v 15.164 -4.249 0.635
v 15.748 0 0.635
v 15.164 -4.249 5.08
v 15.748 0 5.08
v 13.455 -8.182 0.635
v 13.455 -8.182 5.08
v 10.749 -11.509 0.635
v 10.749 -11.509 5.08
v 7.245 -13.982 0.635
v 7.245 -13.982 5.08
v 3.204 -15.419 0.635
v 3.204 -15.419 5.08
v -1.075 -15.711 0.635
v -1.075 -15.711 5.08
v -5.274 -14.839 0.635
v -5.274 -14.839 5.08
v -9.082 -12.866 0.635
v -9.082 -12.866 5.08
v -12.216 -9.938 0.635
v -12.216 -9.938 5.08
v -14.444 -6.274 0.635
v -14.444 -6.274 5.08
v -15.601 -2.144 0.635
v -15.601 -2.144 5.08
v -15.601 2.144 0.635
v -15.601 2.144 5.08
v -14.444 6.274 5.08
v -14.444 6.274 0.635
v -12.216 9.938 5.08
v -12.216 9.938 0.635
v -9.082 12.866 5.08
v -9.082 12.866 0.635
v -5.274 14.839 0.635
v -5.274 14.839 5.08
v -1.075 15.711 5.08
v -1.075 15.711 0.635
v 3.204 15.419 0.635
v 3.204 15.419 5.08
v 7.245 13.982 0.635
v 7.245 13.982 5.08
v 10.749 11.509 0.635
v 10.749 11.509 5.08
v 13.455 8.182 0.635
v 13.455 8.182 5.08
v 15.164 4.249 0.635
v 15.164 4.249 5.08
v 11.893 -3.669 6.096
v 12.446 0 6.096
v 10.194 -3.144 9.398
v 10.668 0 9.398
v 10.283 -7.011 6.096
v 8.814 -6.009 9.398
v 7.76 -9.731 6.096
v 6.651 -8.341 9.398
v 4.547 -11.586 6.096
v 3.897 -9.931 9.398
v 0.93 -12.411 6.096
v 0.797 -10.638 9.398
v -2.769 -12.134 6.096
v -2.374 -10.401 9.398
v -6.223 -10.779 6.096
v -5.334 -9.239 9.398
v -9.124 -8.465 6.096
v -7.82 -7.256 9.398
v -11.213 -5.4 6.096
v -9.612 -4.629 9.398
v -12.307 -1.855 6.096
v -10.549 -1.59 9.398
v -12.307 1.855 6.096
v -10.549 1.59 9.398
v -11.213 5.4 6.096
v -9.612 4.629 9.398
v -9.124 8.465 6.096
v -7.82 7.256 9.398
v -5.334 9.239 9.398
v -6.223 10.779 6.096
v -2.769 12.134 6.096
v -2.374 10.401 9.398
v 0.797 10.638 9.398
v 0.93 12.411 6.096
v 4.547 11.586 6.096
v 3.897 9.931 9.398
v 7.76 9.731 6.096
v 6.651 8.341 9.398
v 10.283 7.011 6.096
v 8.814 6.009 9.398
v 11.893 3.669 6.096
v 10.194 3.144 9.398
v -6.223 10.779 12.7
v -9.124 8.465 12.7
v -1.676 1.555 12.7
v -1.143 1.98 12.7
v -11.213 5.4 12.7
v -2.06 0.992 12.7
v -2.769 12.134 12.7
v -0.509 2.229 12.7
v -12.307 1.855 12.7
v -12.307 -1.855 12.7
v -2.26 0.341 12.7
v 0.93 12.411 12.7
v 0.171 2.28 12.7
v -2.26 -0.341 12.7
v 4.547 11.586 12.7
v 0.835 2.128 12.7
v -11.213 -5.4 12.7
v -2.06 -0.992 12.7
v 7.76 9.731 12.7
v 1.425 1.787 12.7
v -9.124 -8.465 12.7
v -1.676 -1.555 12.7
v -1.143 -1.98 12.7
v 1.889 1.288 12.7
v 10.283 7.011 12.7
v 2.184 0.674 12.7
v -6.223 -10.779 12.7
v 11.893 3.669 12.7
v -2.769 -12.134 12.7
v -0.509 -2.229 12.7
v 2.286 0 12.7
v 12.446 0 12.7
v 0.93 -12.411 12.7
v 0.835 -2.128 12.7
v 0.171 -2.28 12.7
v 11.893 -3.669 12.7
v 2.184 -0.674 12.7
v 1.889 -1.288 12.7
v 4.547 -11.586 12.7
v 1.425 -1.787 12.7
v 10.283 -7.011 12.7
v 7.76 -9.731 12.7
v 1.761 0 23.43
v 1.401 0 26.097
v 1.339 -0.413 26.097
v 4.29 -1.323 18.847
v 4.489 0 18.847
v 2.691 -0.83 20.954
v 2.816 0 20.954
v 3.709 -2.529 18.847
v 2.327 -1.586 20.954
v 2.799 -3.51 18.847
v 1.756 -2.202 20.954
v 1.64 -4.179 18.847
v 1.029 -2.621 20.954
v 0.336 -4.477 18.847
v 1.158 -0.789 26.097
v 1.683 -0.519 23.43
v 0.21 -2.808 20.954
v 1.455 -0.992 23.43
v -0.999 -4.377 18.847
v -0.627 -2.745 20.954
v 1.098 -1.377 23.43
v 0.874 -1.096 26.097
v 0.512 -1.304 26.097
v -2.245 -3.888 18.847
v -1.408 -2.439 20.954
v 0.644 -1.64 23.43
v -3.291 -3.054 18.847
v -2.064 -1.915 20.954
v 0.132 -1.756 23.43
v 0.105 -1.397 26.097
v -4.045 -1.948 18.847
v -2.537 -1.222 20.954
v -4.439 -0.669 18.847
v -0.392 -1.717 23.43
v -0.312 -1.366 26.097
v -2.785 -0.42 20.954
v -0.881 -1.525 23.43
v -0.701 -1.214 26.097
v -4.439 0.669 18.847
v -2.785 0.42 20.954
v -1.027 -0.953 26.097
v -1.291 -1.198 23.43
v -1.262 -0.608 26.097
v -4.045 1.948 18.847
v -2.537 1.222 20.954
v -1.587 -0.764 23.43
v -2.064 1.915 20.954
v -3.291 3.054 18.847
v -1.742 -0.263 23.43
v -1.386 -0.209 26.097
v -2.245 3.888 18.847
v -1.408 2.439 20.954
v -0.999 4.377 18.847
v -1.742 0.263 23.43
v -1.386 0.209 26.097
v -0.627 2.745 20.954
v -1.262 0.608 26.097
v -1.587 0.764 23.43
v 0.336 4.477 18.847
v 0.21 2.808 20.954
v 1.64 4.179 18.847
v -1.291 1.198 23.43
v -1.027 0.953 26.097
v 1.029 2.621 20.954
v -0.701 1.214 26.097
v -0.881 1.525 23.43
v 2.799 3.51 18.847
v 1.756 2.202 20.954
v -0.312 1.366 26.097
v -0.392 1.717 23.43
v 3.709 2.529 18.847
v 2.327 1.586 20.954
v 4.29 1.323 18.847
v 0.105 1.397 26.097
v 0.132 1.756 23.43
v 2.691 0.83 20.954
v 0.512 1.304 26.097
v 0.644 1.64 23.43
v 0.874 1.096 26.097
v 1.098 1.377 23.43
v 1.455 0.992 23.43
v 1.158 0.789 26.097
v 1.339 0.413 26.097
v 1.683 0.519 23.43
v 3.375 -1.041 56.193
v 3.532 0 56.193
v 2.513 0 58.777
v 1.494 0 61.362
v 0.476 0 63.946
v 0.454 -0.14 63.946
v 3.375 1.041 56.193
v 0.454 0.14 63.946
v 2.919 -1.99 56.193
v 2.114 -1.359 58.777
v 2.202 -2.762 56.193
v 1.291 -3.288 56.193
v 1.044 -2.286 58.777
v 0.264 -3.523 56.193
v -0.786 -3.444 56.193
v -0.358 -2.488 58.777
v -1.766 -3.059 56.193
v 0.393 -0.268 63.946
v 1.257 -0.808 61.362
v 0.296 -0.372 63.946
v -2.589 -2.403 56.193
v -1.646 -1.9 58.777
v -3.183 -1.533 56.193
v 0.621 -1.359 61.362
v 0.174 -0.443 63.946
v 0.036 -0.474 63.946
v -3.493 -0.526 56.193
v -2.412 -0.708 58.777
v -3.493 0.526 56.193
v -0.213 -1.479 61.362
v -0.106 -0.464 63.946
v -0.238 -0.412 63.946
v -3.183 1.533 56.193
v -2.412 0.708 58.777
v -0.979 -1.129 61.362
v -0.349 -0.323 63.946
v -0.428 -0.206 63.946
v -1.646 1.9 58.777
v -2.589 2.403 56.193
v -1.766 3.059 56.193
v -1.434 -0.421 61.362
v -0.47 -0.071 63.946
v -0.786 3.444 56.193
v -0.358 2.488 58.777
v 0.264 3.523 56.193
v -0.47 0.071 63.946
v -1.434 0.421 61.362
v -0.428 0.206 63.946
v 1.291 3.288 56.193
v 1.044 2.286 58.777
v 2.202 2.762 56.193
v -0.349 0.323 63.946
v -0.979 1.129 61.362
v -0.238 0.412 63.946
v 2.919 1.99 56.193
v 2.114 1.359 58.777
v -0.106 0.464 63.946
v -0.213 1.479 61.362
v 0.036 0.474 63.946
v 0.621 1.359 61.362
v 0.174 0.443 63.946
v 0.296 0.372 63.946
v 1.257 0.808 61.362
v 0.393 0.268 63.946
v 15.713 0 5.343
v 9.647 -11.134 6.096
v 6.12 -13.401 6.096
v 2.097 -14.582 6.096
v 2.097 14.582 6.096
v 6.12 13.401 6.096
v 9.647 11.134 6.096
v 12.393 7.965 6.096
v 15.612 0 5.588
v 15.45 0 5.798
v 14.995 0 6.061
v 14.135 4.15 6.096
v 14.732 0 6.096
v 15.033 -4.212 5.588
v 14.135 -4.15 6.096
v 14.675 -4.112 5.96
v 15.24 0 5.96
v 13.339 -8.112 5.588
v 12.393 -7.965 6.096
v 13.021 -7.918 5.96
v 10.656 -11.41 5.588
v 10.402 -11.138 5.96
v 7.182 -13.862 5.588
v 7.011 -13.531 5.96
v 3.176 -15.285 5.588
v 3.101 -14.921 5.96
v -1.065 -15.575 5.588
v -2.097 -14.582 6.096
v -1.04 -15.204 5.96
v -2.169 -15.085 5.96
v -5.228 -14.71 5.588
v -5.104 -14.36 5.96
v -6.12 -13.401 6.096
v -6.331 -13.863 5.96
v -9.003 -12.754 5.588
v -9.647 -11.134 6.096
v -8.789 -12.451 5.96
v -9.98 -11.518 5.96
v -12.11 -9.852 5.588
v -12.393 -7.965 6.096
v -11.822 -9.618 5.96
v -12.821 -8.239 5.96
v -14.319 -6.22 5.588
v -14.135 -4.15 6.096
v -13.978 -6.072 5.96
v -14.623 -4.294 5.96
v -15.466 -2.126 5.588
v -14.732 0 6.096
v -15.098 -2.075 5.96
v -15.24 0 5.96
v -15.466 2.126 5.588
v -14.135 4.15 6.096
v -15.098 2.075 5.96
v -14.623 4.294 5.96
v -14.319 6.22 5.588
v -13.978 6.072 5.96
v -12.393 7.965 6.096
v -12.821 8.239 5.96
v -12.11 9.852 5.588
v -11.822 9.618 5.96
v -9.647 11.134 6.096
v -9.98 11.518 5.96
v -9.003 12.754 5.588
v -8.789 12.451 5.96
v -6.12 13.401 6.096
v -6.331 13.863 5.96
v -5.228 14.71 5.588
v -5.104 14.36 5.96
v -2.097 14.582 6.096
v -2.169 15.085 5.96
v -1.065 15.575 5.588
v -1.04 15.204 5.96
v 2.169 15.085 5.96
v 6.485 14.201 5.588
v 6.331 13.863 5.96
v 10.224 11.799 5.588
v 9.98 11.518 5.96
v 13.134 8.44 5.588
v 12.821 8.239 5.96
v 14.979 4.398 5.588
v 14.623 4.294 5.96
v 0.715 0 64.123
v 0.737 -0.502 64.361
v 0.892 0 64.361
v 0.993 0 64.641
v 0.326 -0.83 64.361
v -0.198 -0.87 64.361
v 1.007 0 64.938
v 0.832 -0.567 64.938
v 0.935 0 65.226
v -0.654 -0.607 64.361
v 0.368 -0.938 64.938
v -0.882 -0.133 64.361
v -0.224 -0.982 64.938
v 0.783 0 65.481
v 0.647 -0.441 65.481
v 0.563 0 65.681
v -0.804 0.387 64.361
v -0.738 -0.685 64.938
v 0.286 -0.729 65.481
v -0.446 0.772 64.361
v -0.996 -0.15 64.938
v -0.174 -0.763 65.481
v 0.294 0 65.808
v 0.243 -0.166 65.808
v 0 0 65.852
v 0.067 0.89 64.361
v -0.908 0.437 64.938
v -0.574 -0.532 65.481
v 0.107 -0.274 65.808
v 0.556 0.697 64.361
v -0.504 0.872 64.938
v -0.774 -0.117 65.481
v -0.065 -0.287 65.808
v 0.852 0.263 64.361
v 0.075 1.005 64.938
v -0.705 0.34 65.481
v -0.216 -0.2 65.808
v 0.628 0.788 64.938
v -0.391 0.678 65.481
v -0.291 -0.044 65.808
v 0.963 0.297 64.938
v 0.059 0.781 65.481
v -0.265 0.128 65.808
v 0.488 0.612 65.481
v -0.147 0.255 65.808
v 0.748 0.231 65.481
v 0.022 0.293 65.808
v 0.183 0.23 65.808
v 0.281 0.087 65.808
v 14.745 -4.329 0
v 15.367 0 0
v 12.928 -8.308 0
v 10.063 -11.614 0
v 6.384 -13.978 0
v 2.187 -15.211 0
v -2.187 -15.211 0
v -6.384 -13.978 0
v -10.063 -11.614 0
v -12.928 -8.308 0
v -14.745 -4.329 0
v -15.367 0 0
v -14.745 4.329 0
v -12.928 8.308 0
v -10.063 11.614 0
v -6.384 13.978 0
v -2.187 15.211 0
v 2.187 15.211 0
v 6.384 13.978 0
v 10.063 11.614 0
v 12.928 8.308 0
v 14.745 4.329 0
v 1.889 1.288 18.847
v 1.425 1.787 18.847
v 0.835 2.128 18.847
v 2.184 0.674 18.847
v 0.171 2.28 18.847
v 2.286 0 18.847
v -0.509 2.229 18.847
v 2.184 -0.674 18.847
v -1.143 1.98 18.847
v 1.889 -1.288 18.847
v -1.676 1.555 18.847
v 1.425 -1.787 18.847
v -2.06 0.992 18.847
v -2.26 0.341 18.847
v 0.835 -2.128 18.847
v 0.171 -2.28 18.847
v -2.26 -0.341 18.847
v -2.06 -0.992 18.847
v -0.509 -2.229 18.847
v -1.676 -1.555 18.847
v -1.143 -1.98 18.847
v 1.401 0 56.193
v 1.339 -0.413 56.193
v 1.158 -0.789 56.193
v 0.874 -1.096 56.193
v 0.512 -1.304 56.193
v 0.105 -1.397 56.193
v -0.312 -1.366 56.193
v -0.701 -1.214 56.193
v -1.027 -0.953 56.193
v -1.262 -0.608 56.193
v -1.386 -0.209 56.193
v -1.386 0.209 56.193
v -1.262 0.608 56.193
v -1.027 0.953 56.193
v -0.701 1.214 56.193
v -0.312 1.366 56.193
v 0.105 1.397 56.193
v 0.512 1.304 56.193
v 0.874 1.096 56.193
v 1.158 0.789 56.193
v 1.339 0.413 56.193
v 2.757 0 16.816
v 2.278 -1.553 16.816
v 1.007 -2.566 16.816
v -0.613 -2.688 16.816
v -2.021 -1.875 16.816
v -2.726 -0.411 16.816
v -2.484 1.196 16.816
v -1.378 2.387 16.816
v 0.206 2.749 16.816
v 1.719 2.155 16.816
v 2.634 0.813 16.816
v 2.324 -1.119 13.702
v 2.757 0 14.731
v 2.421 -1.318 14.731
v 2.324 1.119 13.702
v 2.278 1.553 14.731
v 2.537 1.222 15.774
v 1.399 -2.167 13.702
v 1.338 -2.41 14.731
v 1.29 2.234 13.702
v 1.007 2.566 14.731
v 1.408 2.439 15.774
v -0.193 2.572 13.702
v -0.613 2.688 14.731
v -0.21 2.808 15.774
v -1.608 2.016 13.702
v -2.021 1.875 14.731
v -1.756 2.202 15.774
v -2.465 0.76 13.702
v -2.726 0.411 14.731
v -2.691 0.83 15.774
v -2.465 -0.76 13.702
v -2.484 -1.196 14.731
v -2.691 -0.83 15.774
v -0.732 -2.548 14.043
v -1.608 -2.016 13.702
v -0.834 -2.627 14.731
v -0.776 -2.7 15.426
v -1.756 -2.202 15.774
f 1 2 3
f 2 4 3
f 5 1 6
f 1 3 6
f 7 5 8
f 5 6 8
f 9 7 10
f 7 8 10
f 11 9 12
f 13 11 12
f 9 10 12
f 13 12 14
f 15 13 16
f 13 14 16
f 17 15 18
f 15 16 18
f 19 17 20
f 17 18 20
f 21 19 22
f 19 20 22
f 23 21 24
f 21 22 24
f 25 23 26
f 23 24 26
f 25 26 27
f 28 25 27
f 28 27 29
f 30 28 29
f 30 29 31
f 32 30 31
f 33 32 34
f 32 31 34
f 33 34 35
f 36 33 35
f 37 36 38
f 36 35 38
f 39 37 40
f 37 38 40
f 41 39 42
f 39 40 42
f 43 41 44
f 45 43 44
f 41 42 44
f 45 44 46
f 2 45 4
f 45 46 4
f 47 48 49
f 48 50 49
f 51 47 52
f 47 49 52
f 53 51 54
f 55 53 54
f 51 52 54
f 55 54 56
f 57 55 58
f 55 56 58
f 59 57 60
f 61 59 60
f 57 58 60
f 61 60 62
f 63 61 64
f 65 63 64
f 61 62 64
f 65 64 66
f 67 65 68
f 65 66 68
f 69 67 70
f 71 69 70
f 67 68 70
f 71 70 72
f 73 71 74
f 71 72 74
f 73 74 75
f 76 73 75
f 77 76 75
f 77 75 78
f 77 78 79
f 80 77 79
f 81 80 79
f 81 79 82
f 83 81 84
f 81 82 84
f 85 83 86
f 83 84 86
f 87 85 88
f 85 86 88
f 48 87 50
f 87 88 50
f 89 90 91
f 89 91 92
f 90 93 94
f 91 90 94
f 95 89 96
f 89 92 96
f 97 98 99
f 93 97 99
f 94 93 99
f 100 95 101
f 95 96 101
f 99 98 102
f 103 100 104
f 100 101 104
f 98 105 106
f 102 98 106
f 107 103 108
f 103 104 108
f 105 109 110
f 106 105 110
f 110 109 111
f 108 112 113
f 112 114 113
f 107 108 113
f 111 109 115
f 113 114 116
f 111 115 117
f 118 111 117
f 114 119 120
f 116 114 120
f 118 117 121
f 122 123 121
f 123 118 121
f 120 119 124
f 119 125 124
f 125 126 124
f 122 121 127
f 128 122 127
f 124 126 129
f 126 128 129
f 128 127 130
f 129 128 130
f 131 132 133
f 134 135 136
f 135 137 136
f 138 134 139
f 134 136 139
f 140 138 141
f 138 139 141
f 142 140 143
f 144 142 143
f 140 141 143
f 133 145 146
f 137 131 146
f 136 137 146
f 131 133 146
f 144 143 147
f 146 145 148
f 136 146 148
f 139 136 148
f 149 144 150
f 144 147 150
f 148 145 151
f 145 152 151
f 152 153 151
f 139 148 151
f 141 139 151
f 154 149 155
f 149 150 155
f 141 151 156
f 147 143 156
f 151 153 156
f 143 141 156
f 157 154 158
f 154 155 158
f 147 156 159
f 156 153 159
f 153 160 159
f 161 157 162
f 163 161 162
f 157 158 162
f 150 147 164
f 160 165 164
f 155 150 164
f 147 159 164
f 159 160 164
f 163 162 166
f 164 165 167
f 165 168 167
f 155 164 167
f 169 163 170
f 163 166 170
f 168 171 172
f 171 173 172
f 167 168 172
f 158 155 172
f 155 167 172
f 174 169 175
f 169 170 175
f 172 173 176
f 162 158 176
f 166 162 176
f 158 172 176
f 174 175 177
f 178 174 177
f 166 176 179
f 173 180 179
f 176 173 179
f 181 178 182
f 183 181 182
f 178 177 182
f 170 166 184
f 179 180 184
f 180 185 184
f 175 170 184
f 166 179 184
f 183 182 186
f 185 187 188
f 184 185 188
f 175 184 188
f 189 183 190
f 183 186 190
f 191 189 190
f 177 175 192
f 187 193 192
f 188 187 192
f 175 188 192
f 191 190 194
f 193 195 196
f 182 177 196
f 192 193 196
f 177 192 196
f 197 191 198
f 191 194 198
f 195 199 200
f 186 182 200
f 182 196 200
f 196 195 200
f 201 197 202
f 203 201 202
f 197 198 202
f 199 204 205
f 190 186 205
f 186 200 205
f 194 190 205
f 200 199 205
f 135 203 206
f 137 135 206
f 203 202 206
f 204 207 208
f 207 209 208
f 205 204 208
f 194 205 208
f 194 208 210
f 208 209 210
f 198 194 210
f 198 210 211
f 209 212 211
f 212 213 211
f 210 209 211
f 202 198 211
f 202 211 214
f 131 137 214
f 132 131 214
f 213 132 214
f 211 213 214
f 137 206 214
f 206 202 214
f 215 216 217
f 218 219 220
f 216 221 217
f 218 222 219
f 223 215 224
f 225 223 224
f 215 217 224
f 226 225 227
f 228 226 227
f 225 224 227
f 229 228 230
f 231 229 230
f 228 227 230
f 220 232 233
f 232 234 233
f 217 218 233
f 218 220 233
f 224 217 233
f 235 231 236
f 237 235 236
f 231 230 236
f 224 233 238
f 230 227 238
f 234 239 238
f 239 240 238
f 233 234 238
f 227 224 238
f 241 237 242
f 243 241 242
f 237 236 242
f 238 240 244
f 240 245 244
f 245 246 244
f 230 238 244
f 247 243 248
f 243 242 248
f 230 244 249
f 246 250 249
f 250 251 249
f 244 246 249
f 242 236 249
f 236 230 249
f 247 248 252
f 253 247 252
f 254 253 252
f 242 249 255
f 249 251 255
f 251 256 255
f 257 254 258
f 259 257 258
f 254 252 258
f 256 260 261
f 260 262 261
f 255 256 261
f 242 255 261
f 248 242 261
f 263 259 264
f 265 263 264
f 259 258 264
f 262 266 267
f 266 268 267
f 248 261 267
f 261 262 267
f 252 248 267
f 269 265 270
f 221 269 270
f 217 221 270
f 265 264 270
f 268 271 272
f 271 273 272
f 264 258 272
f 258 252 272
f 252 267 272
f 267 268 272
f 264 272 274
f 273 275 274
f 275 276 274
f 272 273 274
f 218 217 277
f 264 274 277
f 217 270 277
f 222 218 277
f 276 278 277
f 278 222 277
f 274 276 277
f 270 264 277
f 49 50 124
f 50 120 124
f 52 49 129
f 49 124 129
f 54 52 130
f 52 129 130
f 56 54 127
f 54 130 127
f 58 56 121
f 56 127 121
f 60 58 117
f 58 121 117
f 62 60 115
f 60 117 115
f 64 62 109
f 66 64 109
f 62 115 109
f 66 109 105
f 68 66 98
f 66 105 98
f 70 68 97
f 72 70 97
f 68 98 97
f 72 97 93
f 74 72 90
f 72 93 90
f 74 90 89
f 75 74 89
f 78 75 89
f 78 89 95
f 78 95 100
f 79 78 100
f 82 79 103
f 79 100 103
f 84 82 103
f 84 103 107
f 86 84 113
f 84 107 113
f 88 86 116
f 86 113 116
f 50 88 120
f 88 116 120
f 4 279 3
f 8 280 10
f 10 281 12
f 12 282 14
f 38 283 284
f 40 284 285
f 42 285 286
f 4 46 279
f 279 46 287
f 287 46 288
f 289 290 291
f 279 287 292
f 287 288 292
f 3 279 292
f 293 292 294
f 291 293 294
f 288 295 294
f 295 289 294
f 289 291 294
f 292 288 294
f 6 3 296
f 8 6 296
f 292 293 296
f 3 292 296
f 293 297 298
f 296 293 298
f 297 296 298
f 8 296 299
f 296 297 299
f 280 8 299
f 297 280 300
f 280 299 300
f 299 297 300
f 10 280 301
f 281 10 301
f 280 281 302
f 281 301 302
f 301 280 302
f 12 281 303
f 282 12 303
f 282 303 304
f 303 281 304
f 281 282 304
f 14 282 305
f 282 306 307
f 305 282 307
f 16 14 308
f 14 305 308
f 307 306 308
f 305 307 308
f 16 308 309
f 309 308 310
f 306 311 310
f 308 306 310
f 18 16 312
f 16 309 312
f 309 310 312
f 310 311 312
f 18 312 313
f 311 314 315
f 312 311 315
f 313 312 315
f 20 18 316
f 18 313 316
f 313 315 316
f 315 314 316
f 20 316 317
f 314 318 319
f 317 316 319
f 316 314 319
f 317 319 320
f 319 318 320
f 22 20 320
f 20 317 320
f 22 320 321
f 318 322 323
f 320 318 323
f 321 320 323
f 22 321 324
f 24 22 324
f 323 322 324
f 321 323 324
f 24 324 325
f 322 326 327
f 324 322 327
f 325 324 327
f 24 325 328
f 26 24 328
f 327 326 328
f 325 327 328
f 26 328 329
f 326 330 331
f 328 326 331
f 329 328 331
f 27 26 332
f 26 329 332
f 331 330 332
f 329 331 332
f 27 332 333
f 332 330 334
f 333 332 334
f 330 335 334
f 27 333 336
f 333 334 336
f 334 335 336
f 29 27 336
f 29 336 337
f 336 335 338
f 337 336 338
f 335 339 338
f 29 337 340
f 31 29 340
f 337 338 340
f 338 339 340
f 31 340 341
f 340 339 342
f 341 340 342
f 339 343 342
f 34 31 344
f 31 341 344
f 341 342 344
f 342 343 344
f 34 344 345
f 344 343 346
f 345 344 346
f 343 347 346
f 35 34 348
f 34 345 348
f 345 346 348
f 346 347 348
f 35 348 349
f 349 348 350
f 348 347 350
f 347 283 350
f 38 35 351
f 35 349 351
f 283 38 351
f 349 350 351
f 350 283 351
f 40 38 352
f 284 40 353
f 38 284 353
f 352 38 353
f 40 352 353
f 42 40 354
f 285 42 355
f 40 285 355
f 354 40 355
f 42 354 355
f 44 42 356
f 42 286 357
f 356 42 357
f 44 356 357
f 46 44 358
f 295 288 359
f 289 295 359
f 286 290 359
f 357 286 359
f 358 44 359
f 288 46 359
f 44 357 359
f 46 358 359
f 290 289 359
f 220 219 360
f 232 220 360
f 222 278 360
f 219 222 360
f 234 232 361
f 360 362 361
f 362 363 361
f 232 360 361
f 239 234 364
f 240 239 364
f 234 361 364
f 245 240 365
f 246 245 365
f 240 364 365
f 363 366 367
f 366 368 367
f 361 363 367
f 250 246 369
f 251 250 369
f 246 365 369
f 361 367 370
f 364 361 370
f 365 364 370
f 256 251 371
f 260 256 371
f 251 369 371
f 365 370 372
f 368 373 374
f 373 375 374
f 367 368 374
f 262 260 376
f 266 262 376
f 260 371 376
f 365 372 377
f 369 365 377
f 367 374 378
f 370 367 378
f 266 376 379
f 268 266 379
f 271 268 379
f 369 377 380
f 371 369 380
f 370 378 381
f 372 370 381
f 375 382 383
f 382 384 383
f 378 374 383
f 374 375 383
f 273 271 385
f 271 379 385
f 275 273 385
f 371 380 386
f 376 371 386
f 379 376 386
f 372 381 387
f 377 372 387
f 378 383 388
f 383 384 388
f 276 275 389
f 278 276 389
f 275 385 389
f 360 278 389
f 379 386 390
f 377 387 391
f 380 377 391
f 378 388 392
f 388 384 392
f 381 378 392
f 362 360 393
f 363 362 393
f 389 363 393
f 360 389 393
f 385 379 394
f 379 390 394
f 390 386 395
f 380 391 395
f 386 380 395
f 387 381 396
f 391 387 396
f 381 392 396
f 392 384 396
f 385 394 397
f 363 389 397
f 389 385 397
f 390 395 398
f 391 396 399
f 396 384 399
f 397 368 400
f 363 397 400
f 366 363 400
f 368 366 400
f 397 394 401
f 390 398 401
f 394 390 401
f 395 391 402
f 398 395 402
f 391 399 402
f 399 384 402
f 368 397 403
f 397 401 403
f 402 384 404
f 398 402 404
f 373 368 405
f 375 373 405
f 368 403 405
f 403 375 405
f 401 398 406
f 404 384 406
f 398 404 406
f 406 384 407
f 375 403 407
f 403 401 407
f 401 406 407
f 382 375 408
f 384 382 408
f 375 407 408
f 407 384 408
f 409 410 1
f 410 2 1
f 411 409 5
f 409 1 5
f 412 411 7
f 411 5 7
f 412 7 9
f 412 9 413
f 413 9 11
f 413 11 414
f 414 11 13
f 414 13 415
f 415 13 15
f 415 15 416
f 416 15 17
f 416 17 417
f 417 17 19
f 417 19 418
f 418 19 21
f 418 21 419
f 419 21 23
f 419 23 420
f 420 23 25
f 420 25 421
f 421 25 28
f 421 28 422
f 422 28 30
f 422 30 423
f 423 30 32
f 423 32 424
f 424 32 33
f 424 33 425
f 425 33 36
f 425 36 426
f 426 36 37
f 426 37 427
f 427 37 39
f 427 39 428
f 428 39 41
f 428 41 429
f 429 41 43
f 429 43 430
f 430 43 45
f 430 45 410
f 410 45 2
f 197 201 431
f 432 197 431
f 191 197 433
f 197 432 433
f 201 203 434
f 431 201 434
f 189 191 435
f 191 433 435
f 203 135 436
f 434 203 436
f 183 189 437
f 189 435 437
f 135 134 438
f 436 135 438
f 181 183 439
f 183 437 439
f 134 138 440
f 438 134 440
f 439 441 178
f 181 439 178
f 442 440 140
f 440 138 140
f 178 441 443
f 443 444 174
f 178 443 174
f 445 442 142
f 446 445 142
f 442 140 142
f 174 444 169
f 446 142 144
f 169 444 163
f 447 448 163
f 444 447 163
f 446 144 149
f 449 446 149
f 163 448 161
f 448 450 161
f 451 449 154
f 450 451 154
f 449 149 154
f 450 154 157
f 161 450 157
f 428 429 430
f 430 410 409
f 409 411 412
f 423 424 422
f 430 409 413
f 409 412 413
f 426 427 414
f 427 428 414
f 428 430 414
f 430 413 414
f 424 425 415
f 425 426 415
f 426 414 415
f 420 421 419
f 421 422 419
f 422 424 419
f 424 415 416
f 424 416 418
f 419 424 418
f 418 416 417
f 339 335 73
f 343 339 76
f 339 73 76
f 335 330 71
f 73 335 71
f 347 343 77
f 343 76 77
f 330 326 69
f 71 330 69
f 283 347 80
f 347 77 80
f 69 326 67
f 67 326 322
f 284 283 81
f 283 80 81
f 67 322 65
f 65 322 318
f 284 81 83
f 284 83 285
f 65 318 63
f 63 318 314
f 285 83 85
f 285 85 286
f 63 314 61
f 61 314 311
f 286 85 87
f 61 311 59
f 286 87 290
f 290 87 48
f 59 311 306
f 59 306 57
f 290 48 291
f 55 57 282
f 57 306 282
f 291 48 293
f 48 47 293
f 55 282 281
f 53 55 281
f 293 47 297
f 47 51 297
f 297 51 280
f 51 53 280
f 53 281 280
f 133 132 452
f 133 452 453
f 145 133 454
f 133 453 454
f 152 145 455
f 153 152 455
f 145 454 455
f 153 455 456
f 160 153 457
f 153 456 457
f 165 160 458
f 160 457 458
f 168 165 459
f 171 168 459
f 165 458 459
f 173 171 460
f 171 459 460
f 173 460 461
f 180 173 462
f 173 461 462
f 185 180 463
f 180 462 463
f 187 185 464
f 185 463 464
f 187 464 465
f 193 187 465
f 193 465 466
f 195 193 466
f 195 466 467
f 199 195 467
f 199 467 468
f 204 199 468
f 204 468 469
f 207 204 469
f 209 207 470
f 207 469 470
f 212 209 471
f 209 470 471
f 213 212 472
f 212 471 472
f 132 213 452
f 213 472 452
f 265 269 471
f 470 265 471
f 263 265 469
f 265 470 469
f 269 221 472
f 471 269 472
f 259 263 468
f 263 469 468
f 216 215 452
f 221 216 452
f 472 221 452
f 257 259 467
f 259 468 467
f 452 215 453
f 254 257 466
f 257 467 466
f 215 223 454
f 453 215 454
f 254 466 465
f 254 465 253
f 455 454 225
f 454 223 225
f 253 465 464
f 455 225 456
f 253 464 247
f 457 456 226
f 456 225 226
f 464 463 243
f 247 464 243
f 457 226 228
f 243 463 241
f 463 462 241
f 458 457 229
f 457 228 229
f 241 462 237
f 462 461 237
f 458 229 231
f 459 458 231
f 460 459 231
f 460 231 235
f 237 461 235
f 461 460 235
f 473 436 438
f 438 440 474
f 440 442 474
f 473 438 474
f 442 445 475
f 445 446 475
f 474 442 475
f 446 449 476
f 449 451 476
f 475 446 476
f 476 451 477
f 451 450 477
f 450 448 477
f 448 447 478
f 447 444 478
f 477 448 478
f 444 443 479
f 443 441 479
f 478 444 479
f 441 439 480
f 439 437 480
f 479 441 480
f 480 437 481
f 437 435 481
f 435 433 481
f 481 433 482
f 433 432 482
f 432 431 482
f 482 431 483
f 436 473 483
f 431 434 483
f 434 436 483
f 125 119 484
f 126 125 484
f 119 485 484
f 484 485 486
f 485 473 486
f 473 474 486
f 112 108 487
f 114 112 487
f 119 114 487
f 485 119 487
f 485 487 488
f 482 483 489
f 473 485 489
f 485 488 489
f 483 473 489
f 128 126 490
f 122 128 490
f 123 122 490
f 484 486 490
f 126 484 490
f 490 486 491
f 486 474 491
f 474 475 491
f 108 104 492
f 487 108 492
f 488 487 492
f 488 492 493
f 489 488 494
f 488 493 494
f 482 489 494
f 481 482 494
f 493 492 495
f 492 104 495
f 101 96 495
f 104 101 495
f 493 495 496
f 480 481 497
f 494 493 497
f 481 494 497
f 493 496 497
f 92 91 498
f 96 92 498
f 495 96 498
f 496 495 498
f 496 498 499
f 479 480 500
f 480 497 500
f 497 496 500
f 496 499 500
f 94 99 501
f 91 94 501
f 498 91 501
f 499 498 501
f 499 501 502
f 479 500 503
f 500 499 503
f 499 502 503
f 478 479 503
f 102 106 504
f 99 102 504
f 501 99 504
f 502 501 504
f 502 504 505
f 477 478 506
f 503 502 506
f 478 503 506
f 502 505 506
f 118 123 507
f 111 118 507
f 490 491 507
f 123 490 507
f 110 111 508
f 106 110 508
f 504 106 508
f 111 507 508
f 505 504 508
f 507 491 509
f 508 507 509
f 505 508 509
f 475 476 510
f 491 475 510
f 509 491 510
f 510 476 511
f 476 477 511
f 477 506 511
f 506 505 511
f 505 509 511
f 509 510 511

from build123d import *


with BuildPart() as f1:
    # F0 (on Front) → F1 (revolve)
    with BuildSketch(Plane.XZ):
        with BuildLine():
            Line((0, 0), (15.367, 0))
            Line((15.367, 0), (15.748, 0.635))
            Line((15.748, 0.635), (15.748, 5.08))
            ThreePointArc((15.748, 5.08), (15.45042, 5.79842), (14.732, 6.096))
            Line((14.732, 6.096), (12.446, 6.096))
            Line((12.446, 6.096), (10.668, 9.398))
            Line((10.668, 9.398), (12.446, 12.7))
            Line((12.446, 12.7), (2.286, 12.7))
            ThreePointArc((2.286, 12.7), (2.816039, 15.7737), (2.286, 18.8474))
            Line((2.286, 18.8474), (4.489498, 18.8474))
            ThreePointArc((4.489498, 18.8474), (2.205484, 22.156792), (1.401251, 26.09659))
            Line((1.401251, 26.09659), (1.401251, 56.192838))
            Line((1.401251, 56.192838), (3.532426, 56.192838))
            Line((3.532426, 56.192838), (0.475527, 63.946038))
            ThreePointArc((0.475527, 63.946038), (0.982077, 65.084624), (0, 65.85176))
            Line((0, 65.85176), (0, 0))
        make_face()
    revolve(axis=Axis((0, 0, 32.92588), (0, 0, -1)))


solid = f1.part
